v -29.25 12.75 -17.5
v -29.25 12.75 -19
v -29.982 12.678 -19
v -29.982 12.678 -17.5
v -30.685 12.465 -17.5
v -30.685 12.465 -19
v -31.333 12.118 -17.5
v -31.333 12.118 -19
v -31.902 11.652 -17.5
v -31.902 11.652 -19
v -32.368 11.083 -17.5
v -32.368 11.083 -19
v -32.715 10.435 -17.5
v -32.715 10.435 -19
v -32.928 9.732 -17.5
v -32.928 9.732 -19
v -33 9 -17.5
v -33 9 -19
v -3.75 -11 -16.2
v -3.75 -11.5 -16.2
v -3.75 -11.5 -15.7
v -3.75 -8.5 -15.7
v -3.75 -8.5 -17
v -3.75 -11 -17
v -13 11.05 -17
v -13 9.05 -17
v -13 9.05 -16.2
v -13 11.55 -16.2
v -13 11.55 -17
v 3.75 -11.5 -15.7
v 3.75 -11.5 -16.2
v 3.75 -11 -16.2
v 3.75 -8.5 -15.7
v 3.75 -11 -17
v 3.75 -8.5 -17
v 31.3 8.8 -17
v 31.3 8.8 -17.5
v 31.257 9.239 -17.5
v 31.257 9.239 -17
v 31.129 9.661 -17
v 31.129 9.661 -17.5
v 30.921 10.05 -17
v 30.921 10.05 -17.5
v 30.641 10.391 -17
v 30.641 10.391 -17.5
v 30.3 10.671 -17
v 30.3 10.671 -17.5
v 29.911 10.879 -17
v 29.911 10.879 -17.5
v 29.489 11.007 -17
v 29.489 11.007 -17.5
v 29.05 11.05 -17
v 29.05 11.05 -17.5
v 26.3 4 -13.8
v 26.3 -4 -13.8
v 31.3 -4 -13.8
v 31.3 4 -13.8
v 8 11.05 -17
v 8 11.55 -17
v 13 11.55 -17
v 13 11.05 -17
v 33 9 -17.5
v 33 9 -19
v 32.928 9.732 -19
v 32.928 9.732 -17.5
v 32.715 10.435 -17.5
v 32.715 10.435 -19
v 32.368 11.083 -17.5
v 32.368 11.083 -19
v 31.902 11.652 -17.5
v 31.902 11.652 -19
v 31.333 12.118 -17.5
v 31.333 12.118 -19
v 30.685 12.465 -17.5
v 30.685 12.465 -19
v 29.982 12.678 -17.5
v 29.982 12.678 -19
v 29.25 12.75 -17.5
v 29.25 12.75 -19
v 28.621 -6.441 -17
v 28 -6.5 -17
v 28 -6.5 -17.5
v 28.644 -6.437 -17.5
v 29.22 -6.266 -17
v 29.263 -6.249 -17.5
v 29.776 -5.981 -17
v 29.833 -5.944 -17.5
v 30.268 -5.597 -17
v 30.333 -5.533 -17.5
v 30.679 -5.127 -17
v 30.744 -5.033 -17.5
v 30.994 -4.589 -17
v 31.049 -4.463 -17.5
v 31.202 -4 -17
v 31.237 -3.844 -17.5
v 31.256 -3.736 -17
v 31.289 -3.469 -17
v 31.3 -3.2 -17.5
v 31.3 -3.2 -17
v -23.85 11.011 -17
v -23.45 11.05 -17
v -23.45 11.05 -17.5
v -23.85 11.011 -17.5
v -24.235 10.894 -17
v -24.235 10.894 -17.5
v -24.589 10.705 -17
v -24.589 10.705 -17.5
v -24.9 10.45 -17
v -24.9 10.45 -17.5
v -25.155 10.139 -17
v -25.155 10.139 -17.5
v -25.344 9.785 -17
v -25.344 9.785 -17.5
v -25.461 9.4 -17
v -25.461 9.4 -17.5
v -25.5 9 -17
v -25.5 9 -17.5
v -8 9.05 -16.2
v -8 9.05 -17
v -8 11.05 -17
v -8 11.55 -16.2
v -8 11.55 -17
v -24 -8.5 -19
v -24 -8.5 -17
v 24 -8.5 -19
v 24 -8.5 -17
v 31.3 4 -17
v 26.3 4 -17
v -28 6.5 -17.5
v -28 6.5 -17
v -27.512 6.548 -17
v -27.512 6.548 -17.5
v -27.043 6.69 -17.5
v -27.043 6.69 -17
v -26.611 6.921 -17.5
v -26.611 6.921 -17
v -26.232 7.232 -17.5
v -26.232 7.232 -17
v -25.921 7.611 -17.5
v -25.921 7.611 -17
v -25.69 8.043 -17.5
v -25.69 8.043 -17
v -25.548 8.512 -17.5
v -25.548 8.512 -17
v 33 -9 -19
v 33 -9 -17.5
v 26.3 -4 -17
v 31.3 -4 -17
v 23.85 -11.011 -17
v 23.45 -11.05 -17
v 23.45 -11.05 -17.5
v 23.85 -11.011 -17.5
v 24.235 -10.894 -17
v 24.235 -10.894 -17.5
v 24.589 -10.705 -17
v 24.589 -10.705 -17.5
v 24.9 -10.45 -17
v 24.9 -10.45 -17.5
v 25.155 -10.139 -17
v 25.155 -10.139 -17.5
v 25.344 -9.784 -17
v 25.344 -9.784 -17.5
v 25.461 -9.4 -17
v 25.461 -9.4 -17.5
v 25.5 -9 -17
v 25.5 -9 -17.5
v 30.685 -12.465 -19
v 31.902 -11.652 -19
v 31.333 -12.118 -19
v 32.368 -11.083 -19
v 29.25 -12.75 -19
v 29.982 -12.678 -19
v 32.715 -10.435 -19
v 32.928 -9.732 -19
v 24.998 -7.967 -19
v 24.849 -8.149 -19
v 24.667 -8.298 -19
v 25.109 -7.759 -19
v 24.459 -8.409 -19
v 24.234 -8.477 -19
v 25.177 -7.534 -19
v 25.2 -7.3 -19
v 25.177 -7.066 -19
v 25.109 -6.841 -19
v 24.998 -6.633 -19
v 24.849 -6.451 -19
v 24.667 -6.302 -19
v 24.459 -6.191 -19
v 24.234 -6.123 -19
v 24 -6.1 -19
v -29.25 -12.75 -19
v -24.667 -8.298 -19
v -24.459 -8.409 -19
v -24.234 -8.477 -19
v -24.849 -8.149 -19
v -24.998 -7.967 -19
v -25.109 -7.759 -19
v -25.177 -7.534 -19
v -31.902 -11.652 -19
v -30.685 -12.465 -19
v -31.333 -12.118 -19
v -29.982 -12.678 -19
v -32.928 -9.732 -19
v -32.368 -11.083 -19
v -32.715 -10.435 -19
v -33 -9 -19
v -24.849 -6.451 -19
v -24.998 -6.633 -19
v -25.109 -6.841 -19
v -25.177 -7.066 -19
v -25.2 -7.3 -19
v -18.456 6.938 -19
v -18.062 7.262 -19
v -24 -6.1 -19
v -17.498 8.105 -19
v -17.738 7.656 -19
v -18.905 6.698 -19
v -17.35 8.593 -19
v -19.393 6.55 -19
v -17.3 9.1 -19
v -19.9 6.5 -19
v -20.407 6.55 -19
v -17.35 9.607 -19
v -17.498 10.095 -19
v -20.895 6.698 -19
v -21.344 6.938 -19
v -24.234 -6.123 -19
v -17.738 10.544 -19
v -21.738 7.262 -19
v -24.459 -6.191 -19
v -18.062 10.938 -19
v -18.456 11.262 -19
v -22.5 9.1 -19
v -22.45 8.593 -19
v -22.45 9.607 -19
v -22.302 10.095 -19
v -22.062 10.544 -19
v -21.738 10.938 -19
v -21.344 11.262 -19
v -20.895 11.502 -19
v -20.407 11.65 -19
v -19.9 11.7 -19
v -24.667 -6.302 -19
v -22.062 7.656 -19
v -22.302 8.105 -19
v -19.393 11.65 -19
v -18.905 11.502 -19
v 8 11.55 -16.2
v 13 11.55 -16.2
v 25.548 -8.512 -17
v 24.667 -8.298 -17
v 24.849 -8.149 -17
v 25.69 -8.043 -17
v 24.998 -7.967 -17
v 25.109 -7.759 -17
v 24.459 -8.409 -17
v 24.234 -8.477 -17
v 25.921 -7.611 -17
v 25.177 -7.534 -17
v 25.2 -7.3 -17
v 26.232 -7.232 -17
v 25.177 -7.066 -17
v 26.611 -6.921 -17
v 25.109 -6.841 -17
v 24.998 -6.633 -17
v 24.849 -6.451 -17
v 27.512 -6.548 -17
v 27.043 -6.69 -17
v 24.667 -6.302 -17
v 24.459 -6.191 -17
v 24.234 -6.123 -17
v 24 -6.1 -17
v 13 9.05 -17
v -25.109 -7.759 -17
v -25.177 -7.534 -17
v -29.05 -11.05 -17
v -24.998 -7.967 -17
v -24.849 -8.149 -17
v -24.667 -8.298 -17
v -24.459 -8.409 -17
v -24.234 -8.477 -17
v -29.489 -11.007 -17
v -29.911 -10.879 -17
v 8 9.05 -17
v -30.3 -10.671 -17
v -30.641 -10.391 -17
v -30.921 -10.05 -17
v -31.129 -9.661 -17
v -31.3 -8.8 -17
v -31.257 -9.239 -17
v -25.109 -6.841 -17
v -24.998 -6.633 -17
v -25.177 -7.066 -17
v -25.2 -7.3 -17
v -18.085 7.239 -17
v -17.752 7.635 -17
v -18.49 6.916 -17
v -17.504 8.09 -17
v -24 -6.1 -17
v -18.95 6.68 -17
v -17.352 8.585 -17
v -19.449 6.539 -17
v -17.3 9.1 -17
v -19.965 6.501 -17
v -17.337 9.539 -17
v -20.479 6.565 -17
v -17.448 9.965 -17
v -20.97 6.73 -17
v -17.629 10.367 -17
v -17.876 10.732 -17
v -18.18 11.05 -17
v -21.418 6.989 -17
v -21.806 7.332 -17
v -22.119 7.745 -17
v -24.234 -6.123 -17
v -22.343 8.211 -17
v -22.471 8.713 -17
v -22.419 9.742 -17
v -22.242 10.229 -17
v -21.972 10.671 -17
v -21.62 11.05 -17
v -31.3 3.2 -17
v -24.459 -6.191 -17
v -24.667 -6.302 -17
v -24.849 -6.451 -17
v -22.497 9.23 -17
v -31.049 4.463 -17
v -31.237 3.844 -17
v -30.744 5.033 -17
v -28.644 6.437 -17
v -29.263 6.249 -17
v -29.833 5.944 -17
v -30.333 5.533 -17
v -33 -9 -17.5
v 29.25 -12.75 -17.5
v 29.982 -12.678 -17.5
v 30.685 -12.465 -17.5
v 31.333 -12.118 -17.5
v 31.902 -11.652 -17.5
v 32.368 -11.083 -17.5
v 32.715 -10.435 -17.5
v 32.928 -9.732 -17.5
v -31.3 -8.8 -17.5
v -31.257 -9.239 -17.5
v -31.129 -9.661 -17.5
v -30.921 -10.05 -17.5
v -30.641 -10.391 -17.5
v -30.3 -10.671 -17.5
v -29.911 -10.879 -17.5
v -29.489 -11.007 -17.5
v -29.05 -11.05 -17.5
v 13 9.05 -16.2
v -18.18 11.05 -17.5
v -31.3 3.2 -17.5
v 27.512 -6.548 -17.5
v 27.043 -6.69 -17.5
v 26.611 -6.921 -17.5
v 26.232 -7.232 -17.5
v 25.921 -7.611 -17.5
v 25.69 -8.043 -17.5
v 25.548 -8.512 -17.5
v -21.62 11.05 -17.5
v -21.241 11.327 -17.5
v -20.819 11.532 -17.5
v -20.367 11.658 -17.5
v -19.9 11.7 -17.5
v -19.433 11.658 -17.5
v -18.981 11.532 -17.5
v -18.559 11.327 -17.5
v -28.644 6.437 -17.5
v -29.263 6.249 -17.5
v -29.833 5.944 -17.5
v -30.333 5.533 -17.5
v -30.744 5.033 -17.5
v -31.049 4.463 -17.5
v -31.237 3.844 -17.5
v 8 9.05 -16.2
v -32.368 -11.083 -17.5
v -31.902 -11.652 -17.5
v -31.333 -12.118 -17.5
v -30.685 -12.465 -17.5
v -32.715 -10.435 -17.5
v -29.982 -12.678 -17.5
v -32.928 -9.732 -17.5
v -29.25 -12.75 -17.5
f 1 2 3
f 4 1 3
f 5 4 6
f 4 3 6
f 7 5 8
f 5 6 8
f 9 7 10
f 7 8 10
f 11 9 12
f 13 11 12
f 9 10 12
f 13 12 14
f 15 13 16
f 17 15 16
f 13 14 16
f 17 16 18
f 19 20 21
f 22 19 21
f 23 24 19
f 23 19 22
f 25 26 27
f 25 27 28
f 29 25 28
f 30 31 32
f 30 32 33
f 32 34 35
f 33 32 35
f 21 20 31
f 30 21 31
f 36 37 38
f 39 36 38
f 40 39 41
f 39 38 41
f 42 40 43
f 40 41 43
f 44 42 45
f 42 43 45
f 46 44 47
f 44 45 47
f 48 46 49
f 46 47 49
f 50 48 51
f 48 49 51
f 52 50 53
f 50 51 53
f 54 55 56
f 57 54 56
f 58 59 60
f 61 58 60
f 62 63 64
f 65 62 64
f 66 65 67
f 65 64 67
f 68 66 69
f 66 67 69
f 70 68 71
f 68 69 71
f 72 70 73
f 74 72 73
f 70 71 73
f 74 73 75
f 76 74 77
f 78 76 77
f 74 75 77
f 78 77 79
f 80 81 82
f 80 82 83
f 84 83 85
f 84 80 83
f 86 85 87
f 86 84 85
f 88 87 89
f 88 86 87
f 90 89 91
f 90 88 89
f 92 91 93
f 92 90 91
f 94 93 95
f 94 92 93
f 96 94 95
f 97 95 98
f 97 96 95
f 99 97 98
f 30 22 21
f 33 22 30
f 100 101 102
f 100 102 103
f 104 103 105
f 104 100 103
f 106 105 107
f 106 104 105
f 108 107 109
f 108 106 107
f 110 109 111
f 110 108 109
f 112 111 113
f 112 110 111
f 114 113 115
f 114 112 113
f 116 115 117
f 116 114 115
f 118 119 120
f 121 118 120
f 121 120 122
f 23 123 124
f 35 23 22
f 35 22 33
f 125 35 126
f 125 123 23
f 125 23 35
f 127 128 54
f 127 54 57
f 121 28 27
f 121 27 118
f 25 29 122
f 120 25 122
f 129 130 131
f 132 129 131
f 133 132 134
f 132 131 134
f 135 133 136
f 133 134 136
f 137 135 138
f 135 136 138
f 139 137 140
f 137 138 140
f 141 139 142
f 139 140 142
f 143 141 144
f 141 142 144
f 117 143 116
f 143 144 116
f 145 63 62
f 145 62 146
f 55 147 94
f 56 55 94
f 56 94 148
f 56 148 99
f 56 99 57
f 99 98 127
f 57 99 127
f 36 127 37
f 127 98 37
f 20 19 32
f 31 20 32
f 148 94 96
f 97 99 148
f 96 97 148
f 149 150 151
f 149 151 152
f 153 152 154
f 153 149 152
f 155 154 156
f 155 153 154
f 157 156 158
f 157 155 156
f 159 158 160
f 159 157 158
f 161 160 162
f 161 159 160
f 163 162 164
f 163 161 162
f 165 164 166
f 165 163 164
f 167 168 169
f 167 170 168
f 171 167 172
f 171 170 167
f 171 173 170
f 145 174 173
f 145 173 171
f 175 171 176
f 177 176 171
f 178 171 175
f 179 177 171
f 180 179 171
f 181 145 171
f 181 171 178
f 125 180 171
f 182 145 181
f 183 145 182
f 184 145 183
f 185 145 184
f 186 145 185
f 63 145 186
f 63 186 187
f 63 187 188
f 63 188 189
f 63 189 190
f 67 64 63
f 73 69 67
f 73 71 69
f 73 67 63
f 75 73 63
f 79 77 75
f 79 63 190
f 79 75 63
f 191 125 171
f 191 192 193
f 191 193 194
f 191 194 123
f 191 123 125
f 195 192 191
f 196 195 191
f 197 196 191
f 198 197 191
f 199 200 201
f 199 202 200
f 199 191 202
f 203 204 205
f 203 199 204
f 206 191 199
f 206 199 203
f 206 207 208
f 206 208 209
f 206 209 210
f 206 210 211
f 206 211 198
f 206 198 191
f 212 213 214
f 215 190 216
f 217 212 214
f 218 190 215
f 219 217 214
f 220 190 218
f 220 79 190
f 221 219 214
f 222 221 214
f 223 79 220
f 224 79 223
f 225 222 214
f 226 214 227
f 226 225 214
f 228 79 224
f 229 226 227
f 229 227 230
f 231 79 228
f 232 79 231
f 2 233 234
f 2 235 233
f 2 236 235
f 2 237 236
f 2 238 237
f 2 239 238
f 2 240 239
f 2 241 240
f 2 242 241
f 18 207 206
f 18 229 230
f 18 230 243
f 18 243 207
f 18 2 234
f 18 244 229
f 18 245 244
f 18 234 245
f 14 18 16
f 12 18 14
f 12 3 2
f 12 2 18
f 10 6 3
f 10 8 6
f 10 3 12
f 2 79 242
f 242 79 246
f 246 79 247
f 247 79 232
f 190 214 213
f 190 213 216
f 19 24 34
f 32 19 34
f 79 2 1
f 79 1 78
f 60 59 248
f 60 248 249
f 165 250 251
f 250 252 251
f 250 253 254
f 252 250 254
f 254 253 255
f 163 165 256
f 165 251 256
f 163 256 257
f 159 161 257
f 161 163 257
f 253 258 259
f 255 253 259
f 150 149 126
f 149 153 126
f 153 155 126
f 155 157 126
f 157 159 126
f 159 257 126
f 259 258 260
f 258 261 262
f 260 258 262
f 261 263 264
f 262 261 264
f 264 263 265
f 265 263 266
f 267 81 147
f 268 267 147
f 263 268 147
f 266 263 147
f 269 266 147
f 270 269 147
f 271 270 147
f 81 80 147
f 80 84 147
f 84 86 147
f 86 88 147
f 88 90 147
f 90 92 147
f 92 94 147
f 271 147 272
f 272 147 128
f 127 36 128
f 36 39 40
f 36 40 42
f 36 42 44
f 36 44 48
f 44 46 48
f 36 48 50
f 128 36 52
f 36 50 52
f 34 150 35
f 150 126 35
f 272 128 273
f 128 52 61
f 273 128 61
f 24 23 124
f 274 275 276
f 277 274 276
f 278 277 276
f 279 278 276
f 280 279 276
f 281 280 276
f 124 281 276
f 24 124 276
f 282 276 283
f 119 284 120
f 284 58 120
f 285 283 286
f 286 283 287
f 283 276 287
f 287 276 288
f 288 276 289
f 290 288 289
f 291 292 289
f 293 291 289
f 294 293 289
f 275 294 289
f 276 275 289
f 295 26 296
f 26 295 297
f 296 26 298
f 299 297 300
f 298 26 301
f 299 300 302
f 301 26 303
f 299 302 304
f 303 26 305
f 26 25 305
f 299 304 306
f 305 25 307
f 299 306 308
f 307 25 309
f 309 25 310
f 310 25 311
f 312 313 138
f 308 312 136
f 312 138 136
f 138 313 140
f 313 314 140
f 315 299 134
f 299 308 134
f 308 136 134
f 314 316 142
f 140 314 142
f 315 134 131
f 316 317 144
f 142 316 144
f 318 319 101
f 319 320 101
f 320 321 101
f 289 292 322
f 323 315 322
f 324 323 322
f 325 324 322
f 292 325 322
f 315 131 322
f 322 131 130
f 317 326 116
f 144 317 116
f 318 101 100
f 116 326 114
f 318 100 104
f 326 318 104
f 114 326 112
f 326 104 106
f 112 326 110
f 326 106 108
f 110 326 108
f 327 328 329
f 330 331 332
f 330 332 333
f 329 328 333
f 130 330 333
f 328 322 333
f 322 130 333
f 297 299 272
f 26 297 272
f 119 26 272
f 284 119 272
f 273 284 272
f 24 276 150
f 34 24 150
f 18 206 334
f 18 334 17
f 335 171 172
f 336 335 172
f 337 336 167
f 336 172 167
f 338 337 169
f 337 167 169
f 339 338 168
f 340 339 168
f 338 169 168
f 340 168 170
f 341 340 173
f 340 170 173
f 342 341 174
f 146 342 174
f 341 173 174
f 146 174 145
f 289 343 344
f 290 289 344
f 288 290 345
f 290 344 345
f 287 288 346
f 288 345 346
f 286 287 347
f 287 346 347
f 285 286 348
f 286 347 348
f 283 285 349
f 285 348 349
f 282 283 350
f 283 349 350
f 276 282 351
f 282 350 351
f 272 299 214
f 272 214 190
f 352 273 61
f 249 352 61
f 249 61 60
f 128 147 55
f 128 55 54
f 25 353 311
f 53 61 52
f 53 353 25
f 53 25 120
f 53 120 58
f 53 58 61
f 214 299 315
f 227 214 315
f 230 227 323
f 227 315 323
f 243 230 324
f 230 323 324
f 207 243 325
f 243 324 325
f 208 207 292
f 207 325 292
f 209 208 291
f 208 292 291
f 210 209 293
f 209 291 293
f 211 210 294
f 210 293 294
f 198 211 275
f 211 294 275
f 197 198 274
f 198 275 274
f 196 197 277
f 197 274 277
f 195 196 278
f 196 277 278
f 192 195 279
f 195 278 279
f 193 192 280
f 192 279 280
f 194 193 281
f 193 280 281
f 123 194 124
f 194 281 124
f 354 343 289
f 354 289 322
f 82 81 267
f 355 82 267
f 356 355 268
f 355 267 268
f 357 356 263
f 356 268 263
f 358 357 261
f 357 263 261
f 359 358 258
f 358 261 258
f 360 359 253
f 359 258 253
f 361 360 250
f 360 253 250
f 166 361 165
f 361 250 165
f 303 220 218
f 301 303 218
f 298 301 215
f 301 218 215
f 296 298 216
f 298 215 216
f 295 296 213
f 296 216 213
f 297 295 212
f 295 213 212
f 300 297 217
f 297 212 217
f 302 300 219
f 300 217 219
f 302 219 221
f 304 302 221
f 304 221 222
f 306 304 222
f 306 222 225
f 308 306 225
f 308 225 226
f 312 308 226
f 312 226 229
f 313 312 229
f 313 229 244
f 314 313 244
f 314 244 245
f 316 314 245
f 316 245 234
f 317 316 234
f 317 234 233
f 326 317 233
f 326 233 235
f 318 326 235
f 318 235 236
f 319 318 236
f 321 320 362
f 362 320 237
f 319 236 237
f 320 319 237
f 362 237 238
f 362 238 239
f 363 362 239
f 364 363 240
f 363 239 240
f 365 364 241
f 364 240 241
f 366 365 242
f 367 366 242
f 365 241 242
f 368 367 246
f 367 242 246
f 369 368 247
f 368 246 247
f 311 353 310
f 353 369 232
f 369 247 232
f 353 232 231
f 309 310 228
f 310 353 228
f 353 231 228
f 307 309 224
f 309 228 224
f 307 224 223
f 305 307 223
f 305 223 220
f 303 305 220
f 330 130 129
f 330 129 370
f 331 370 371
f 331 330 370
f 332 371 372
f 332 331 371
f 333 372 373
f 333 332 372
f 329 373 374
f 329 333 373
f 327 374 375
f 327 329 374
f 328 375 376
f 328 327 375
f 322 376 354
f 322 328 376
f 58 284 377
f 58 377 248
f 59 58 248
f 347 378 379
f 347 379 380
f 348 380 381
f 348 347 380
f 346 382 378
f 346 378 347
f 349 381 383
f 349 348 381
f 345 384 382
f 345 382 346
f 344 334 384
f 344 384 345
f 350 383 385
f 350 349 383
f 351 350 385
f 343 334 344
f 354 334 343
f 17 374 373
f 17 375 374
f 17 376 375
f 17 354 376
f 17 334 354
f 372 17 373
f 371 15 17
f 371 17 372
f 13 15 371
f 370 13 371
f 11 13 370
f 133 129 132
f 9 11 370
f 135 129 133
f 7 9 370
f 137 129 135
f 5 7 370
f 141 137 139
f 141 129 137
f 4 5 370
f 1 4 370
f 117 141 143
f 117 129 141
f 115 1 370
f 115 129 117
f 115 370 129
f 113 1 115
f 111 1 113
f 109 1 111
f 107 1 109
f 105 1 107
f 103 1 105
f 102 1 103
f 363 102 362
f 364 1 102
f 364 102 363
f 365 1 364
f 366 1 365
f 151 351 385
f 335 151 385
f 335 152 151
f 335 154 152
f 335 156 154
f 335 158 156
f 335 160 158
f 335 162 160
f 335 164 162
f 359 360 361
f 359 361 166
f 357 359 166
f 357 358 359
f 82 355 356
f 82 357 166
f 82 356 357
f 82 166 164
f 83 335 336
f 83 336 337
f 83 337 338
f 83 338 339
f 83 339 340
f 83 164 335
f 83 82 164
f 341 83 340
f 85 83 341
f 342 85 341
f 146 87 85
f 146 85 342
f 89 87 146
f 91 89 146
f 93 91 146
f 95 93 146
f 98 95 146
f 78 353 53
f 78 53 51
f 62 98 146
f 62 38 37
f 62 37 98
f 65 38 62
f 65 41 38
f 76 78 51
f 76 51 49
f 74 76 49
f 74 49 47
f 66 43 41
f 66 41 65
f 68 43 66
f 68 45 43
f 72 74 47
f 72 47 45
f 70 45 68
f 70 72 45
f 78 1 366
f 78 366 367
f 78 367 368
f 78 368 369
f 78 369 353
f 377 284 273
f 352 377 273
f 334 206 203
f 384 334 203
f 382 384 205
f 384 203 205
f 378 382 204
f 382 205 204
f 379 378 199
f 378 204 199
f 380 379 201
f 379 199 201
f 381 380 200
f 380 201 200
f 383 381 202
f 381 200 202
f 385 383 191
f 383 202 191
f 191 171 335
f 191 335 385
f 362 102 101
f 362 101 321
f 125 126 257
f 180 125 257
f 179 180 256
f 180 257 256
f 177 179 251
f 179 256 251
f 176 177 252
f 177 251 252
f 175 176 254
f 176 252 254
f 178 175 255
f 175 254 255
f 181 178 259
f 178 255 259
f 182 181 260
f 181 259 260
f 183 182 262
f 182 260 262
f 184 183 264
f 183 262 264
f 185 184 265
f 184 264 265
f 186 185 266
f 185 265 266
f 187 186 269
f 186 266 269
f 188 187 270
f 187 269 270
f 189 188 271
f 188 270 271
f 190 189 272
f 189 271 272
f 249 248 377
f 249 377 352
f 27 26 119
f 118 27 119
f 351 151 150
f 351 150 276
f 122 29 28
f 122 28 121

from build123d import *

# Parameters (mm, degrees)
PAD007_DEPTH    = 1.5
PAD008_DEPTH    = 0.5
SKETCH012_W     = 5
SKETCH012_H     = 2.5
SKETCH012_W_2   = 7.5
PAD009_DEPTH    = 0.8
SKETCH013_W     = 7.5
SKETCH013_H     = 3
PAD010_DEPTH    = 0.5
POCKET003_DEPTH = 0.5
POCKET004_DEPTH = 2
SKETCH021_W     = 5
SKETCH021_H     = 8
PAD013_DEPTH    = 3.2
SKETCH024_R     = 2.6
POCKET007_DEPTH = 5.201


with BuildPart() as part:
    # Sketch010 → Pad007 (new body)
    with BuildSketch(Plane.XY.offset(-19)):
        with BuildLine():
            Line((-29.25, 12.75), (29.25, 12.75))
            ThreePointArc((33, 9), (31.9016504294, 11.6516504294), (29.25, 12.75))
            Line((33, 9), (33, -9))
            ThreePointArc((29.25, -12.75), (31.9016504295, -11.6516504294), (33, -9))
            Line((29.25, -12.75), (-29.25, -12.75))
            ThreePointArc((-33, -9), (-31.9016504294, -11.6516504295), (-29.25, -12.75))
            Line((-33, -9), (-33, 9))
            ThreePointArc((-29.25, 12.75), (-31.9016504294, 11.6516504294), (-33, 9))
        make_face()
    extrude(amount=PAD007_DEPTH)

    # Sketch011 → Pad008 (new body)
    with BuildSketch(Plane.XY.offset(-17.5)):
        with BuildLine():
            Line((-29.05, 11.05), (29.05, 11.05))
            ThreePointArc((31.3, 8.8), (30.6409902577, 10.3909902577), (29.05, 11.05))
            Line((31.3, 8.8), (31.3, -8.8))
            ThreePointArc((29.05, -11.05), (30.6409902577, -10.3909902577), (31.3, -8.8))
            Line((29.05, -11.05), (-29.05, -11.05))
            ThreePointArc((-31.3, -8.8), (-30.6409902577, -10.3909902577), (-29.05, -11.05))
            Line((-31.3, -8.8), (-31.3, 8.8))
            ThreePointArc((-29.05, 11.05), (-30.6409902577, 10.3909902577), (-31.3, 8.8))
        make_face()
    extrude(amount=PAD008_DEPTH)

    # Sketch012 → Pad009 (new body)
    with BuildSketch(Plane.XY.offset(-17)):
        with Locations((-10.5, 10.3)):
            Rectangle(SKETCH012_W, SKETCH012_H)
        with Locations((10.5, 10.3)):
            Rectangle(SKETCH012_W, SKETCH012_H)
        with Locations((0, -9.75)):
            Rectangle(SKETCH012_W_2, SKETCH012_H)
    extrude(amount=PAD009_DEPTH)

    # Sketch013 → Pad010 (new body)
    with BuildSketch(Plane.XY.offset(-16.2)):
        with Locations((0, -10)):
            Rectangle(SKETCH013_W, SKETCH013_H)
    extrude(amount=PAD010_DEPTH)

    # Sketch016 → Pocket003 (cut)
    with BuildSketch(Plane.XY.offset(-17)):
        with BuildLine():
            ThreePointArc((28.00000543, -6.5), (26.2322368866, -7.2322292075), (25.5, -8.99999457))
            ThreePointArc((23.4499998257, -11.05), (24.8995699389, -10.4495662225), (25.5, -8.99999457))
            Line((23.4499998257, -11.25), (23.4499998257, -11.05))
            Line((31.5, -11.25), (23.4499998257, -11.25))
            Line((31.5, -3.1999998258), (31.5, -11.25))
            Line((31.3, -3.1999998258), (31.5, -3.1999998258))
            ThreePointArc((28.00000543, -6.5), (30.3334594583, -5.5334554955), (31.3, -3.1999998258))
        make_face()
        with BuildLine():
            Line((-23.4499998257, 11.05), (-23.4499998257, 11.25))
            Line((-23.4499998257, 11.25), (-31.5, 11.25))
            Line((-31.5, 11.25), (-31.5, 3.1999998257))
            Line((-31.5, 3.1999998257), (-31.3, 3.1999998257))
            ThreePointArc((-27.9999999386, 6.5), (-30.3334523833, 5.5334523035), (-31.3, 3.1999998257))
            ThreePointArc((-27.9999999386, 6.5), (-26.2322330036, 7.2322330904), (-25.5, 9.0000000614))
            ThreePointArc((-23.4499998257, 11.05), (-24.8995688016, 10.4495689682), (-25.5, 9.0000000614))
        make_face()
    extrude(amount=-POCKET003_DEPTH, mode=Mode.SUBTRACT)

    # Sketch017 → Pocket004 (cut)
    with BuildSketch(Plane.XY.offset(-17)):
        with BuildLine():
            ThreePointArc((-24, -6.1), (-25.2, -7.3), (-24, -8.5))
            Line((-24, -8.5), (24, -8.5))
            ThreePointArc((24, -8.5), (25.2, -7.3), (24, -6.1))
            Line((-24, -6.1), (24, -6.1))
        make_face()
    extrude(amount=-POCKET004_DEPTH, mode=Mode.SUBTRACT)

    # Sketch021 → Pad013 (new body)
    with BuildSketch(Plane.XY.offset(-17)):
        with Locations((28.8, 0)):
            Rectangle(SKETCH021_W, SKETCH021_H)
    extrude(amount=PAD013_DEPTH)

    # Sketch024 → Pocket007 (cut, through all)
    with BuildSketch(Plane(origin=(0, 0, -19), x_dir=(1, 0, 0), z_dir=(0, 0, -1))):
        with Locations((-19.9, -9.1)):
            Circle(SKETCH024_R)
    extrude(amount=-POCKET007_DEPTH, mode=Mode.SUBTRACT)


solid = part.part
